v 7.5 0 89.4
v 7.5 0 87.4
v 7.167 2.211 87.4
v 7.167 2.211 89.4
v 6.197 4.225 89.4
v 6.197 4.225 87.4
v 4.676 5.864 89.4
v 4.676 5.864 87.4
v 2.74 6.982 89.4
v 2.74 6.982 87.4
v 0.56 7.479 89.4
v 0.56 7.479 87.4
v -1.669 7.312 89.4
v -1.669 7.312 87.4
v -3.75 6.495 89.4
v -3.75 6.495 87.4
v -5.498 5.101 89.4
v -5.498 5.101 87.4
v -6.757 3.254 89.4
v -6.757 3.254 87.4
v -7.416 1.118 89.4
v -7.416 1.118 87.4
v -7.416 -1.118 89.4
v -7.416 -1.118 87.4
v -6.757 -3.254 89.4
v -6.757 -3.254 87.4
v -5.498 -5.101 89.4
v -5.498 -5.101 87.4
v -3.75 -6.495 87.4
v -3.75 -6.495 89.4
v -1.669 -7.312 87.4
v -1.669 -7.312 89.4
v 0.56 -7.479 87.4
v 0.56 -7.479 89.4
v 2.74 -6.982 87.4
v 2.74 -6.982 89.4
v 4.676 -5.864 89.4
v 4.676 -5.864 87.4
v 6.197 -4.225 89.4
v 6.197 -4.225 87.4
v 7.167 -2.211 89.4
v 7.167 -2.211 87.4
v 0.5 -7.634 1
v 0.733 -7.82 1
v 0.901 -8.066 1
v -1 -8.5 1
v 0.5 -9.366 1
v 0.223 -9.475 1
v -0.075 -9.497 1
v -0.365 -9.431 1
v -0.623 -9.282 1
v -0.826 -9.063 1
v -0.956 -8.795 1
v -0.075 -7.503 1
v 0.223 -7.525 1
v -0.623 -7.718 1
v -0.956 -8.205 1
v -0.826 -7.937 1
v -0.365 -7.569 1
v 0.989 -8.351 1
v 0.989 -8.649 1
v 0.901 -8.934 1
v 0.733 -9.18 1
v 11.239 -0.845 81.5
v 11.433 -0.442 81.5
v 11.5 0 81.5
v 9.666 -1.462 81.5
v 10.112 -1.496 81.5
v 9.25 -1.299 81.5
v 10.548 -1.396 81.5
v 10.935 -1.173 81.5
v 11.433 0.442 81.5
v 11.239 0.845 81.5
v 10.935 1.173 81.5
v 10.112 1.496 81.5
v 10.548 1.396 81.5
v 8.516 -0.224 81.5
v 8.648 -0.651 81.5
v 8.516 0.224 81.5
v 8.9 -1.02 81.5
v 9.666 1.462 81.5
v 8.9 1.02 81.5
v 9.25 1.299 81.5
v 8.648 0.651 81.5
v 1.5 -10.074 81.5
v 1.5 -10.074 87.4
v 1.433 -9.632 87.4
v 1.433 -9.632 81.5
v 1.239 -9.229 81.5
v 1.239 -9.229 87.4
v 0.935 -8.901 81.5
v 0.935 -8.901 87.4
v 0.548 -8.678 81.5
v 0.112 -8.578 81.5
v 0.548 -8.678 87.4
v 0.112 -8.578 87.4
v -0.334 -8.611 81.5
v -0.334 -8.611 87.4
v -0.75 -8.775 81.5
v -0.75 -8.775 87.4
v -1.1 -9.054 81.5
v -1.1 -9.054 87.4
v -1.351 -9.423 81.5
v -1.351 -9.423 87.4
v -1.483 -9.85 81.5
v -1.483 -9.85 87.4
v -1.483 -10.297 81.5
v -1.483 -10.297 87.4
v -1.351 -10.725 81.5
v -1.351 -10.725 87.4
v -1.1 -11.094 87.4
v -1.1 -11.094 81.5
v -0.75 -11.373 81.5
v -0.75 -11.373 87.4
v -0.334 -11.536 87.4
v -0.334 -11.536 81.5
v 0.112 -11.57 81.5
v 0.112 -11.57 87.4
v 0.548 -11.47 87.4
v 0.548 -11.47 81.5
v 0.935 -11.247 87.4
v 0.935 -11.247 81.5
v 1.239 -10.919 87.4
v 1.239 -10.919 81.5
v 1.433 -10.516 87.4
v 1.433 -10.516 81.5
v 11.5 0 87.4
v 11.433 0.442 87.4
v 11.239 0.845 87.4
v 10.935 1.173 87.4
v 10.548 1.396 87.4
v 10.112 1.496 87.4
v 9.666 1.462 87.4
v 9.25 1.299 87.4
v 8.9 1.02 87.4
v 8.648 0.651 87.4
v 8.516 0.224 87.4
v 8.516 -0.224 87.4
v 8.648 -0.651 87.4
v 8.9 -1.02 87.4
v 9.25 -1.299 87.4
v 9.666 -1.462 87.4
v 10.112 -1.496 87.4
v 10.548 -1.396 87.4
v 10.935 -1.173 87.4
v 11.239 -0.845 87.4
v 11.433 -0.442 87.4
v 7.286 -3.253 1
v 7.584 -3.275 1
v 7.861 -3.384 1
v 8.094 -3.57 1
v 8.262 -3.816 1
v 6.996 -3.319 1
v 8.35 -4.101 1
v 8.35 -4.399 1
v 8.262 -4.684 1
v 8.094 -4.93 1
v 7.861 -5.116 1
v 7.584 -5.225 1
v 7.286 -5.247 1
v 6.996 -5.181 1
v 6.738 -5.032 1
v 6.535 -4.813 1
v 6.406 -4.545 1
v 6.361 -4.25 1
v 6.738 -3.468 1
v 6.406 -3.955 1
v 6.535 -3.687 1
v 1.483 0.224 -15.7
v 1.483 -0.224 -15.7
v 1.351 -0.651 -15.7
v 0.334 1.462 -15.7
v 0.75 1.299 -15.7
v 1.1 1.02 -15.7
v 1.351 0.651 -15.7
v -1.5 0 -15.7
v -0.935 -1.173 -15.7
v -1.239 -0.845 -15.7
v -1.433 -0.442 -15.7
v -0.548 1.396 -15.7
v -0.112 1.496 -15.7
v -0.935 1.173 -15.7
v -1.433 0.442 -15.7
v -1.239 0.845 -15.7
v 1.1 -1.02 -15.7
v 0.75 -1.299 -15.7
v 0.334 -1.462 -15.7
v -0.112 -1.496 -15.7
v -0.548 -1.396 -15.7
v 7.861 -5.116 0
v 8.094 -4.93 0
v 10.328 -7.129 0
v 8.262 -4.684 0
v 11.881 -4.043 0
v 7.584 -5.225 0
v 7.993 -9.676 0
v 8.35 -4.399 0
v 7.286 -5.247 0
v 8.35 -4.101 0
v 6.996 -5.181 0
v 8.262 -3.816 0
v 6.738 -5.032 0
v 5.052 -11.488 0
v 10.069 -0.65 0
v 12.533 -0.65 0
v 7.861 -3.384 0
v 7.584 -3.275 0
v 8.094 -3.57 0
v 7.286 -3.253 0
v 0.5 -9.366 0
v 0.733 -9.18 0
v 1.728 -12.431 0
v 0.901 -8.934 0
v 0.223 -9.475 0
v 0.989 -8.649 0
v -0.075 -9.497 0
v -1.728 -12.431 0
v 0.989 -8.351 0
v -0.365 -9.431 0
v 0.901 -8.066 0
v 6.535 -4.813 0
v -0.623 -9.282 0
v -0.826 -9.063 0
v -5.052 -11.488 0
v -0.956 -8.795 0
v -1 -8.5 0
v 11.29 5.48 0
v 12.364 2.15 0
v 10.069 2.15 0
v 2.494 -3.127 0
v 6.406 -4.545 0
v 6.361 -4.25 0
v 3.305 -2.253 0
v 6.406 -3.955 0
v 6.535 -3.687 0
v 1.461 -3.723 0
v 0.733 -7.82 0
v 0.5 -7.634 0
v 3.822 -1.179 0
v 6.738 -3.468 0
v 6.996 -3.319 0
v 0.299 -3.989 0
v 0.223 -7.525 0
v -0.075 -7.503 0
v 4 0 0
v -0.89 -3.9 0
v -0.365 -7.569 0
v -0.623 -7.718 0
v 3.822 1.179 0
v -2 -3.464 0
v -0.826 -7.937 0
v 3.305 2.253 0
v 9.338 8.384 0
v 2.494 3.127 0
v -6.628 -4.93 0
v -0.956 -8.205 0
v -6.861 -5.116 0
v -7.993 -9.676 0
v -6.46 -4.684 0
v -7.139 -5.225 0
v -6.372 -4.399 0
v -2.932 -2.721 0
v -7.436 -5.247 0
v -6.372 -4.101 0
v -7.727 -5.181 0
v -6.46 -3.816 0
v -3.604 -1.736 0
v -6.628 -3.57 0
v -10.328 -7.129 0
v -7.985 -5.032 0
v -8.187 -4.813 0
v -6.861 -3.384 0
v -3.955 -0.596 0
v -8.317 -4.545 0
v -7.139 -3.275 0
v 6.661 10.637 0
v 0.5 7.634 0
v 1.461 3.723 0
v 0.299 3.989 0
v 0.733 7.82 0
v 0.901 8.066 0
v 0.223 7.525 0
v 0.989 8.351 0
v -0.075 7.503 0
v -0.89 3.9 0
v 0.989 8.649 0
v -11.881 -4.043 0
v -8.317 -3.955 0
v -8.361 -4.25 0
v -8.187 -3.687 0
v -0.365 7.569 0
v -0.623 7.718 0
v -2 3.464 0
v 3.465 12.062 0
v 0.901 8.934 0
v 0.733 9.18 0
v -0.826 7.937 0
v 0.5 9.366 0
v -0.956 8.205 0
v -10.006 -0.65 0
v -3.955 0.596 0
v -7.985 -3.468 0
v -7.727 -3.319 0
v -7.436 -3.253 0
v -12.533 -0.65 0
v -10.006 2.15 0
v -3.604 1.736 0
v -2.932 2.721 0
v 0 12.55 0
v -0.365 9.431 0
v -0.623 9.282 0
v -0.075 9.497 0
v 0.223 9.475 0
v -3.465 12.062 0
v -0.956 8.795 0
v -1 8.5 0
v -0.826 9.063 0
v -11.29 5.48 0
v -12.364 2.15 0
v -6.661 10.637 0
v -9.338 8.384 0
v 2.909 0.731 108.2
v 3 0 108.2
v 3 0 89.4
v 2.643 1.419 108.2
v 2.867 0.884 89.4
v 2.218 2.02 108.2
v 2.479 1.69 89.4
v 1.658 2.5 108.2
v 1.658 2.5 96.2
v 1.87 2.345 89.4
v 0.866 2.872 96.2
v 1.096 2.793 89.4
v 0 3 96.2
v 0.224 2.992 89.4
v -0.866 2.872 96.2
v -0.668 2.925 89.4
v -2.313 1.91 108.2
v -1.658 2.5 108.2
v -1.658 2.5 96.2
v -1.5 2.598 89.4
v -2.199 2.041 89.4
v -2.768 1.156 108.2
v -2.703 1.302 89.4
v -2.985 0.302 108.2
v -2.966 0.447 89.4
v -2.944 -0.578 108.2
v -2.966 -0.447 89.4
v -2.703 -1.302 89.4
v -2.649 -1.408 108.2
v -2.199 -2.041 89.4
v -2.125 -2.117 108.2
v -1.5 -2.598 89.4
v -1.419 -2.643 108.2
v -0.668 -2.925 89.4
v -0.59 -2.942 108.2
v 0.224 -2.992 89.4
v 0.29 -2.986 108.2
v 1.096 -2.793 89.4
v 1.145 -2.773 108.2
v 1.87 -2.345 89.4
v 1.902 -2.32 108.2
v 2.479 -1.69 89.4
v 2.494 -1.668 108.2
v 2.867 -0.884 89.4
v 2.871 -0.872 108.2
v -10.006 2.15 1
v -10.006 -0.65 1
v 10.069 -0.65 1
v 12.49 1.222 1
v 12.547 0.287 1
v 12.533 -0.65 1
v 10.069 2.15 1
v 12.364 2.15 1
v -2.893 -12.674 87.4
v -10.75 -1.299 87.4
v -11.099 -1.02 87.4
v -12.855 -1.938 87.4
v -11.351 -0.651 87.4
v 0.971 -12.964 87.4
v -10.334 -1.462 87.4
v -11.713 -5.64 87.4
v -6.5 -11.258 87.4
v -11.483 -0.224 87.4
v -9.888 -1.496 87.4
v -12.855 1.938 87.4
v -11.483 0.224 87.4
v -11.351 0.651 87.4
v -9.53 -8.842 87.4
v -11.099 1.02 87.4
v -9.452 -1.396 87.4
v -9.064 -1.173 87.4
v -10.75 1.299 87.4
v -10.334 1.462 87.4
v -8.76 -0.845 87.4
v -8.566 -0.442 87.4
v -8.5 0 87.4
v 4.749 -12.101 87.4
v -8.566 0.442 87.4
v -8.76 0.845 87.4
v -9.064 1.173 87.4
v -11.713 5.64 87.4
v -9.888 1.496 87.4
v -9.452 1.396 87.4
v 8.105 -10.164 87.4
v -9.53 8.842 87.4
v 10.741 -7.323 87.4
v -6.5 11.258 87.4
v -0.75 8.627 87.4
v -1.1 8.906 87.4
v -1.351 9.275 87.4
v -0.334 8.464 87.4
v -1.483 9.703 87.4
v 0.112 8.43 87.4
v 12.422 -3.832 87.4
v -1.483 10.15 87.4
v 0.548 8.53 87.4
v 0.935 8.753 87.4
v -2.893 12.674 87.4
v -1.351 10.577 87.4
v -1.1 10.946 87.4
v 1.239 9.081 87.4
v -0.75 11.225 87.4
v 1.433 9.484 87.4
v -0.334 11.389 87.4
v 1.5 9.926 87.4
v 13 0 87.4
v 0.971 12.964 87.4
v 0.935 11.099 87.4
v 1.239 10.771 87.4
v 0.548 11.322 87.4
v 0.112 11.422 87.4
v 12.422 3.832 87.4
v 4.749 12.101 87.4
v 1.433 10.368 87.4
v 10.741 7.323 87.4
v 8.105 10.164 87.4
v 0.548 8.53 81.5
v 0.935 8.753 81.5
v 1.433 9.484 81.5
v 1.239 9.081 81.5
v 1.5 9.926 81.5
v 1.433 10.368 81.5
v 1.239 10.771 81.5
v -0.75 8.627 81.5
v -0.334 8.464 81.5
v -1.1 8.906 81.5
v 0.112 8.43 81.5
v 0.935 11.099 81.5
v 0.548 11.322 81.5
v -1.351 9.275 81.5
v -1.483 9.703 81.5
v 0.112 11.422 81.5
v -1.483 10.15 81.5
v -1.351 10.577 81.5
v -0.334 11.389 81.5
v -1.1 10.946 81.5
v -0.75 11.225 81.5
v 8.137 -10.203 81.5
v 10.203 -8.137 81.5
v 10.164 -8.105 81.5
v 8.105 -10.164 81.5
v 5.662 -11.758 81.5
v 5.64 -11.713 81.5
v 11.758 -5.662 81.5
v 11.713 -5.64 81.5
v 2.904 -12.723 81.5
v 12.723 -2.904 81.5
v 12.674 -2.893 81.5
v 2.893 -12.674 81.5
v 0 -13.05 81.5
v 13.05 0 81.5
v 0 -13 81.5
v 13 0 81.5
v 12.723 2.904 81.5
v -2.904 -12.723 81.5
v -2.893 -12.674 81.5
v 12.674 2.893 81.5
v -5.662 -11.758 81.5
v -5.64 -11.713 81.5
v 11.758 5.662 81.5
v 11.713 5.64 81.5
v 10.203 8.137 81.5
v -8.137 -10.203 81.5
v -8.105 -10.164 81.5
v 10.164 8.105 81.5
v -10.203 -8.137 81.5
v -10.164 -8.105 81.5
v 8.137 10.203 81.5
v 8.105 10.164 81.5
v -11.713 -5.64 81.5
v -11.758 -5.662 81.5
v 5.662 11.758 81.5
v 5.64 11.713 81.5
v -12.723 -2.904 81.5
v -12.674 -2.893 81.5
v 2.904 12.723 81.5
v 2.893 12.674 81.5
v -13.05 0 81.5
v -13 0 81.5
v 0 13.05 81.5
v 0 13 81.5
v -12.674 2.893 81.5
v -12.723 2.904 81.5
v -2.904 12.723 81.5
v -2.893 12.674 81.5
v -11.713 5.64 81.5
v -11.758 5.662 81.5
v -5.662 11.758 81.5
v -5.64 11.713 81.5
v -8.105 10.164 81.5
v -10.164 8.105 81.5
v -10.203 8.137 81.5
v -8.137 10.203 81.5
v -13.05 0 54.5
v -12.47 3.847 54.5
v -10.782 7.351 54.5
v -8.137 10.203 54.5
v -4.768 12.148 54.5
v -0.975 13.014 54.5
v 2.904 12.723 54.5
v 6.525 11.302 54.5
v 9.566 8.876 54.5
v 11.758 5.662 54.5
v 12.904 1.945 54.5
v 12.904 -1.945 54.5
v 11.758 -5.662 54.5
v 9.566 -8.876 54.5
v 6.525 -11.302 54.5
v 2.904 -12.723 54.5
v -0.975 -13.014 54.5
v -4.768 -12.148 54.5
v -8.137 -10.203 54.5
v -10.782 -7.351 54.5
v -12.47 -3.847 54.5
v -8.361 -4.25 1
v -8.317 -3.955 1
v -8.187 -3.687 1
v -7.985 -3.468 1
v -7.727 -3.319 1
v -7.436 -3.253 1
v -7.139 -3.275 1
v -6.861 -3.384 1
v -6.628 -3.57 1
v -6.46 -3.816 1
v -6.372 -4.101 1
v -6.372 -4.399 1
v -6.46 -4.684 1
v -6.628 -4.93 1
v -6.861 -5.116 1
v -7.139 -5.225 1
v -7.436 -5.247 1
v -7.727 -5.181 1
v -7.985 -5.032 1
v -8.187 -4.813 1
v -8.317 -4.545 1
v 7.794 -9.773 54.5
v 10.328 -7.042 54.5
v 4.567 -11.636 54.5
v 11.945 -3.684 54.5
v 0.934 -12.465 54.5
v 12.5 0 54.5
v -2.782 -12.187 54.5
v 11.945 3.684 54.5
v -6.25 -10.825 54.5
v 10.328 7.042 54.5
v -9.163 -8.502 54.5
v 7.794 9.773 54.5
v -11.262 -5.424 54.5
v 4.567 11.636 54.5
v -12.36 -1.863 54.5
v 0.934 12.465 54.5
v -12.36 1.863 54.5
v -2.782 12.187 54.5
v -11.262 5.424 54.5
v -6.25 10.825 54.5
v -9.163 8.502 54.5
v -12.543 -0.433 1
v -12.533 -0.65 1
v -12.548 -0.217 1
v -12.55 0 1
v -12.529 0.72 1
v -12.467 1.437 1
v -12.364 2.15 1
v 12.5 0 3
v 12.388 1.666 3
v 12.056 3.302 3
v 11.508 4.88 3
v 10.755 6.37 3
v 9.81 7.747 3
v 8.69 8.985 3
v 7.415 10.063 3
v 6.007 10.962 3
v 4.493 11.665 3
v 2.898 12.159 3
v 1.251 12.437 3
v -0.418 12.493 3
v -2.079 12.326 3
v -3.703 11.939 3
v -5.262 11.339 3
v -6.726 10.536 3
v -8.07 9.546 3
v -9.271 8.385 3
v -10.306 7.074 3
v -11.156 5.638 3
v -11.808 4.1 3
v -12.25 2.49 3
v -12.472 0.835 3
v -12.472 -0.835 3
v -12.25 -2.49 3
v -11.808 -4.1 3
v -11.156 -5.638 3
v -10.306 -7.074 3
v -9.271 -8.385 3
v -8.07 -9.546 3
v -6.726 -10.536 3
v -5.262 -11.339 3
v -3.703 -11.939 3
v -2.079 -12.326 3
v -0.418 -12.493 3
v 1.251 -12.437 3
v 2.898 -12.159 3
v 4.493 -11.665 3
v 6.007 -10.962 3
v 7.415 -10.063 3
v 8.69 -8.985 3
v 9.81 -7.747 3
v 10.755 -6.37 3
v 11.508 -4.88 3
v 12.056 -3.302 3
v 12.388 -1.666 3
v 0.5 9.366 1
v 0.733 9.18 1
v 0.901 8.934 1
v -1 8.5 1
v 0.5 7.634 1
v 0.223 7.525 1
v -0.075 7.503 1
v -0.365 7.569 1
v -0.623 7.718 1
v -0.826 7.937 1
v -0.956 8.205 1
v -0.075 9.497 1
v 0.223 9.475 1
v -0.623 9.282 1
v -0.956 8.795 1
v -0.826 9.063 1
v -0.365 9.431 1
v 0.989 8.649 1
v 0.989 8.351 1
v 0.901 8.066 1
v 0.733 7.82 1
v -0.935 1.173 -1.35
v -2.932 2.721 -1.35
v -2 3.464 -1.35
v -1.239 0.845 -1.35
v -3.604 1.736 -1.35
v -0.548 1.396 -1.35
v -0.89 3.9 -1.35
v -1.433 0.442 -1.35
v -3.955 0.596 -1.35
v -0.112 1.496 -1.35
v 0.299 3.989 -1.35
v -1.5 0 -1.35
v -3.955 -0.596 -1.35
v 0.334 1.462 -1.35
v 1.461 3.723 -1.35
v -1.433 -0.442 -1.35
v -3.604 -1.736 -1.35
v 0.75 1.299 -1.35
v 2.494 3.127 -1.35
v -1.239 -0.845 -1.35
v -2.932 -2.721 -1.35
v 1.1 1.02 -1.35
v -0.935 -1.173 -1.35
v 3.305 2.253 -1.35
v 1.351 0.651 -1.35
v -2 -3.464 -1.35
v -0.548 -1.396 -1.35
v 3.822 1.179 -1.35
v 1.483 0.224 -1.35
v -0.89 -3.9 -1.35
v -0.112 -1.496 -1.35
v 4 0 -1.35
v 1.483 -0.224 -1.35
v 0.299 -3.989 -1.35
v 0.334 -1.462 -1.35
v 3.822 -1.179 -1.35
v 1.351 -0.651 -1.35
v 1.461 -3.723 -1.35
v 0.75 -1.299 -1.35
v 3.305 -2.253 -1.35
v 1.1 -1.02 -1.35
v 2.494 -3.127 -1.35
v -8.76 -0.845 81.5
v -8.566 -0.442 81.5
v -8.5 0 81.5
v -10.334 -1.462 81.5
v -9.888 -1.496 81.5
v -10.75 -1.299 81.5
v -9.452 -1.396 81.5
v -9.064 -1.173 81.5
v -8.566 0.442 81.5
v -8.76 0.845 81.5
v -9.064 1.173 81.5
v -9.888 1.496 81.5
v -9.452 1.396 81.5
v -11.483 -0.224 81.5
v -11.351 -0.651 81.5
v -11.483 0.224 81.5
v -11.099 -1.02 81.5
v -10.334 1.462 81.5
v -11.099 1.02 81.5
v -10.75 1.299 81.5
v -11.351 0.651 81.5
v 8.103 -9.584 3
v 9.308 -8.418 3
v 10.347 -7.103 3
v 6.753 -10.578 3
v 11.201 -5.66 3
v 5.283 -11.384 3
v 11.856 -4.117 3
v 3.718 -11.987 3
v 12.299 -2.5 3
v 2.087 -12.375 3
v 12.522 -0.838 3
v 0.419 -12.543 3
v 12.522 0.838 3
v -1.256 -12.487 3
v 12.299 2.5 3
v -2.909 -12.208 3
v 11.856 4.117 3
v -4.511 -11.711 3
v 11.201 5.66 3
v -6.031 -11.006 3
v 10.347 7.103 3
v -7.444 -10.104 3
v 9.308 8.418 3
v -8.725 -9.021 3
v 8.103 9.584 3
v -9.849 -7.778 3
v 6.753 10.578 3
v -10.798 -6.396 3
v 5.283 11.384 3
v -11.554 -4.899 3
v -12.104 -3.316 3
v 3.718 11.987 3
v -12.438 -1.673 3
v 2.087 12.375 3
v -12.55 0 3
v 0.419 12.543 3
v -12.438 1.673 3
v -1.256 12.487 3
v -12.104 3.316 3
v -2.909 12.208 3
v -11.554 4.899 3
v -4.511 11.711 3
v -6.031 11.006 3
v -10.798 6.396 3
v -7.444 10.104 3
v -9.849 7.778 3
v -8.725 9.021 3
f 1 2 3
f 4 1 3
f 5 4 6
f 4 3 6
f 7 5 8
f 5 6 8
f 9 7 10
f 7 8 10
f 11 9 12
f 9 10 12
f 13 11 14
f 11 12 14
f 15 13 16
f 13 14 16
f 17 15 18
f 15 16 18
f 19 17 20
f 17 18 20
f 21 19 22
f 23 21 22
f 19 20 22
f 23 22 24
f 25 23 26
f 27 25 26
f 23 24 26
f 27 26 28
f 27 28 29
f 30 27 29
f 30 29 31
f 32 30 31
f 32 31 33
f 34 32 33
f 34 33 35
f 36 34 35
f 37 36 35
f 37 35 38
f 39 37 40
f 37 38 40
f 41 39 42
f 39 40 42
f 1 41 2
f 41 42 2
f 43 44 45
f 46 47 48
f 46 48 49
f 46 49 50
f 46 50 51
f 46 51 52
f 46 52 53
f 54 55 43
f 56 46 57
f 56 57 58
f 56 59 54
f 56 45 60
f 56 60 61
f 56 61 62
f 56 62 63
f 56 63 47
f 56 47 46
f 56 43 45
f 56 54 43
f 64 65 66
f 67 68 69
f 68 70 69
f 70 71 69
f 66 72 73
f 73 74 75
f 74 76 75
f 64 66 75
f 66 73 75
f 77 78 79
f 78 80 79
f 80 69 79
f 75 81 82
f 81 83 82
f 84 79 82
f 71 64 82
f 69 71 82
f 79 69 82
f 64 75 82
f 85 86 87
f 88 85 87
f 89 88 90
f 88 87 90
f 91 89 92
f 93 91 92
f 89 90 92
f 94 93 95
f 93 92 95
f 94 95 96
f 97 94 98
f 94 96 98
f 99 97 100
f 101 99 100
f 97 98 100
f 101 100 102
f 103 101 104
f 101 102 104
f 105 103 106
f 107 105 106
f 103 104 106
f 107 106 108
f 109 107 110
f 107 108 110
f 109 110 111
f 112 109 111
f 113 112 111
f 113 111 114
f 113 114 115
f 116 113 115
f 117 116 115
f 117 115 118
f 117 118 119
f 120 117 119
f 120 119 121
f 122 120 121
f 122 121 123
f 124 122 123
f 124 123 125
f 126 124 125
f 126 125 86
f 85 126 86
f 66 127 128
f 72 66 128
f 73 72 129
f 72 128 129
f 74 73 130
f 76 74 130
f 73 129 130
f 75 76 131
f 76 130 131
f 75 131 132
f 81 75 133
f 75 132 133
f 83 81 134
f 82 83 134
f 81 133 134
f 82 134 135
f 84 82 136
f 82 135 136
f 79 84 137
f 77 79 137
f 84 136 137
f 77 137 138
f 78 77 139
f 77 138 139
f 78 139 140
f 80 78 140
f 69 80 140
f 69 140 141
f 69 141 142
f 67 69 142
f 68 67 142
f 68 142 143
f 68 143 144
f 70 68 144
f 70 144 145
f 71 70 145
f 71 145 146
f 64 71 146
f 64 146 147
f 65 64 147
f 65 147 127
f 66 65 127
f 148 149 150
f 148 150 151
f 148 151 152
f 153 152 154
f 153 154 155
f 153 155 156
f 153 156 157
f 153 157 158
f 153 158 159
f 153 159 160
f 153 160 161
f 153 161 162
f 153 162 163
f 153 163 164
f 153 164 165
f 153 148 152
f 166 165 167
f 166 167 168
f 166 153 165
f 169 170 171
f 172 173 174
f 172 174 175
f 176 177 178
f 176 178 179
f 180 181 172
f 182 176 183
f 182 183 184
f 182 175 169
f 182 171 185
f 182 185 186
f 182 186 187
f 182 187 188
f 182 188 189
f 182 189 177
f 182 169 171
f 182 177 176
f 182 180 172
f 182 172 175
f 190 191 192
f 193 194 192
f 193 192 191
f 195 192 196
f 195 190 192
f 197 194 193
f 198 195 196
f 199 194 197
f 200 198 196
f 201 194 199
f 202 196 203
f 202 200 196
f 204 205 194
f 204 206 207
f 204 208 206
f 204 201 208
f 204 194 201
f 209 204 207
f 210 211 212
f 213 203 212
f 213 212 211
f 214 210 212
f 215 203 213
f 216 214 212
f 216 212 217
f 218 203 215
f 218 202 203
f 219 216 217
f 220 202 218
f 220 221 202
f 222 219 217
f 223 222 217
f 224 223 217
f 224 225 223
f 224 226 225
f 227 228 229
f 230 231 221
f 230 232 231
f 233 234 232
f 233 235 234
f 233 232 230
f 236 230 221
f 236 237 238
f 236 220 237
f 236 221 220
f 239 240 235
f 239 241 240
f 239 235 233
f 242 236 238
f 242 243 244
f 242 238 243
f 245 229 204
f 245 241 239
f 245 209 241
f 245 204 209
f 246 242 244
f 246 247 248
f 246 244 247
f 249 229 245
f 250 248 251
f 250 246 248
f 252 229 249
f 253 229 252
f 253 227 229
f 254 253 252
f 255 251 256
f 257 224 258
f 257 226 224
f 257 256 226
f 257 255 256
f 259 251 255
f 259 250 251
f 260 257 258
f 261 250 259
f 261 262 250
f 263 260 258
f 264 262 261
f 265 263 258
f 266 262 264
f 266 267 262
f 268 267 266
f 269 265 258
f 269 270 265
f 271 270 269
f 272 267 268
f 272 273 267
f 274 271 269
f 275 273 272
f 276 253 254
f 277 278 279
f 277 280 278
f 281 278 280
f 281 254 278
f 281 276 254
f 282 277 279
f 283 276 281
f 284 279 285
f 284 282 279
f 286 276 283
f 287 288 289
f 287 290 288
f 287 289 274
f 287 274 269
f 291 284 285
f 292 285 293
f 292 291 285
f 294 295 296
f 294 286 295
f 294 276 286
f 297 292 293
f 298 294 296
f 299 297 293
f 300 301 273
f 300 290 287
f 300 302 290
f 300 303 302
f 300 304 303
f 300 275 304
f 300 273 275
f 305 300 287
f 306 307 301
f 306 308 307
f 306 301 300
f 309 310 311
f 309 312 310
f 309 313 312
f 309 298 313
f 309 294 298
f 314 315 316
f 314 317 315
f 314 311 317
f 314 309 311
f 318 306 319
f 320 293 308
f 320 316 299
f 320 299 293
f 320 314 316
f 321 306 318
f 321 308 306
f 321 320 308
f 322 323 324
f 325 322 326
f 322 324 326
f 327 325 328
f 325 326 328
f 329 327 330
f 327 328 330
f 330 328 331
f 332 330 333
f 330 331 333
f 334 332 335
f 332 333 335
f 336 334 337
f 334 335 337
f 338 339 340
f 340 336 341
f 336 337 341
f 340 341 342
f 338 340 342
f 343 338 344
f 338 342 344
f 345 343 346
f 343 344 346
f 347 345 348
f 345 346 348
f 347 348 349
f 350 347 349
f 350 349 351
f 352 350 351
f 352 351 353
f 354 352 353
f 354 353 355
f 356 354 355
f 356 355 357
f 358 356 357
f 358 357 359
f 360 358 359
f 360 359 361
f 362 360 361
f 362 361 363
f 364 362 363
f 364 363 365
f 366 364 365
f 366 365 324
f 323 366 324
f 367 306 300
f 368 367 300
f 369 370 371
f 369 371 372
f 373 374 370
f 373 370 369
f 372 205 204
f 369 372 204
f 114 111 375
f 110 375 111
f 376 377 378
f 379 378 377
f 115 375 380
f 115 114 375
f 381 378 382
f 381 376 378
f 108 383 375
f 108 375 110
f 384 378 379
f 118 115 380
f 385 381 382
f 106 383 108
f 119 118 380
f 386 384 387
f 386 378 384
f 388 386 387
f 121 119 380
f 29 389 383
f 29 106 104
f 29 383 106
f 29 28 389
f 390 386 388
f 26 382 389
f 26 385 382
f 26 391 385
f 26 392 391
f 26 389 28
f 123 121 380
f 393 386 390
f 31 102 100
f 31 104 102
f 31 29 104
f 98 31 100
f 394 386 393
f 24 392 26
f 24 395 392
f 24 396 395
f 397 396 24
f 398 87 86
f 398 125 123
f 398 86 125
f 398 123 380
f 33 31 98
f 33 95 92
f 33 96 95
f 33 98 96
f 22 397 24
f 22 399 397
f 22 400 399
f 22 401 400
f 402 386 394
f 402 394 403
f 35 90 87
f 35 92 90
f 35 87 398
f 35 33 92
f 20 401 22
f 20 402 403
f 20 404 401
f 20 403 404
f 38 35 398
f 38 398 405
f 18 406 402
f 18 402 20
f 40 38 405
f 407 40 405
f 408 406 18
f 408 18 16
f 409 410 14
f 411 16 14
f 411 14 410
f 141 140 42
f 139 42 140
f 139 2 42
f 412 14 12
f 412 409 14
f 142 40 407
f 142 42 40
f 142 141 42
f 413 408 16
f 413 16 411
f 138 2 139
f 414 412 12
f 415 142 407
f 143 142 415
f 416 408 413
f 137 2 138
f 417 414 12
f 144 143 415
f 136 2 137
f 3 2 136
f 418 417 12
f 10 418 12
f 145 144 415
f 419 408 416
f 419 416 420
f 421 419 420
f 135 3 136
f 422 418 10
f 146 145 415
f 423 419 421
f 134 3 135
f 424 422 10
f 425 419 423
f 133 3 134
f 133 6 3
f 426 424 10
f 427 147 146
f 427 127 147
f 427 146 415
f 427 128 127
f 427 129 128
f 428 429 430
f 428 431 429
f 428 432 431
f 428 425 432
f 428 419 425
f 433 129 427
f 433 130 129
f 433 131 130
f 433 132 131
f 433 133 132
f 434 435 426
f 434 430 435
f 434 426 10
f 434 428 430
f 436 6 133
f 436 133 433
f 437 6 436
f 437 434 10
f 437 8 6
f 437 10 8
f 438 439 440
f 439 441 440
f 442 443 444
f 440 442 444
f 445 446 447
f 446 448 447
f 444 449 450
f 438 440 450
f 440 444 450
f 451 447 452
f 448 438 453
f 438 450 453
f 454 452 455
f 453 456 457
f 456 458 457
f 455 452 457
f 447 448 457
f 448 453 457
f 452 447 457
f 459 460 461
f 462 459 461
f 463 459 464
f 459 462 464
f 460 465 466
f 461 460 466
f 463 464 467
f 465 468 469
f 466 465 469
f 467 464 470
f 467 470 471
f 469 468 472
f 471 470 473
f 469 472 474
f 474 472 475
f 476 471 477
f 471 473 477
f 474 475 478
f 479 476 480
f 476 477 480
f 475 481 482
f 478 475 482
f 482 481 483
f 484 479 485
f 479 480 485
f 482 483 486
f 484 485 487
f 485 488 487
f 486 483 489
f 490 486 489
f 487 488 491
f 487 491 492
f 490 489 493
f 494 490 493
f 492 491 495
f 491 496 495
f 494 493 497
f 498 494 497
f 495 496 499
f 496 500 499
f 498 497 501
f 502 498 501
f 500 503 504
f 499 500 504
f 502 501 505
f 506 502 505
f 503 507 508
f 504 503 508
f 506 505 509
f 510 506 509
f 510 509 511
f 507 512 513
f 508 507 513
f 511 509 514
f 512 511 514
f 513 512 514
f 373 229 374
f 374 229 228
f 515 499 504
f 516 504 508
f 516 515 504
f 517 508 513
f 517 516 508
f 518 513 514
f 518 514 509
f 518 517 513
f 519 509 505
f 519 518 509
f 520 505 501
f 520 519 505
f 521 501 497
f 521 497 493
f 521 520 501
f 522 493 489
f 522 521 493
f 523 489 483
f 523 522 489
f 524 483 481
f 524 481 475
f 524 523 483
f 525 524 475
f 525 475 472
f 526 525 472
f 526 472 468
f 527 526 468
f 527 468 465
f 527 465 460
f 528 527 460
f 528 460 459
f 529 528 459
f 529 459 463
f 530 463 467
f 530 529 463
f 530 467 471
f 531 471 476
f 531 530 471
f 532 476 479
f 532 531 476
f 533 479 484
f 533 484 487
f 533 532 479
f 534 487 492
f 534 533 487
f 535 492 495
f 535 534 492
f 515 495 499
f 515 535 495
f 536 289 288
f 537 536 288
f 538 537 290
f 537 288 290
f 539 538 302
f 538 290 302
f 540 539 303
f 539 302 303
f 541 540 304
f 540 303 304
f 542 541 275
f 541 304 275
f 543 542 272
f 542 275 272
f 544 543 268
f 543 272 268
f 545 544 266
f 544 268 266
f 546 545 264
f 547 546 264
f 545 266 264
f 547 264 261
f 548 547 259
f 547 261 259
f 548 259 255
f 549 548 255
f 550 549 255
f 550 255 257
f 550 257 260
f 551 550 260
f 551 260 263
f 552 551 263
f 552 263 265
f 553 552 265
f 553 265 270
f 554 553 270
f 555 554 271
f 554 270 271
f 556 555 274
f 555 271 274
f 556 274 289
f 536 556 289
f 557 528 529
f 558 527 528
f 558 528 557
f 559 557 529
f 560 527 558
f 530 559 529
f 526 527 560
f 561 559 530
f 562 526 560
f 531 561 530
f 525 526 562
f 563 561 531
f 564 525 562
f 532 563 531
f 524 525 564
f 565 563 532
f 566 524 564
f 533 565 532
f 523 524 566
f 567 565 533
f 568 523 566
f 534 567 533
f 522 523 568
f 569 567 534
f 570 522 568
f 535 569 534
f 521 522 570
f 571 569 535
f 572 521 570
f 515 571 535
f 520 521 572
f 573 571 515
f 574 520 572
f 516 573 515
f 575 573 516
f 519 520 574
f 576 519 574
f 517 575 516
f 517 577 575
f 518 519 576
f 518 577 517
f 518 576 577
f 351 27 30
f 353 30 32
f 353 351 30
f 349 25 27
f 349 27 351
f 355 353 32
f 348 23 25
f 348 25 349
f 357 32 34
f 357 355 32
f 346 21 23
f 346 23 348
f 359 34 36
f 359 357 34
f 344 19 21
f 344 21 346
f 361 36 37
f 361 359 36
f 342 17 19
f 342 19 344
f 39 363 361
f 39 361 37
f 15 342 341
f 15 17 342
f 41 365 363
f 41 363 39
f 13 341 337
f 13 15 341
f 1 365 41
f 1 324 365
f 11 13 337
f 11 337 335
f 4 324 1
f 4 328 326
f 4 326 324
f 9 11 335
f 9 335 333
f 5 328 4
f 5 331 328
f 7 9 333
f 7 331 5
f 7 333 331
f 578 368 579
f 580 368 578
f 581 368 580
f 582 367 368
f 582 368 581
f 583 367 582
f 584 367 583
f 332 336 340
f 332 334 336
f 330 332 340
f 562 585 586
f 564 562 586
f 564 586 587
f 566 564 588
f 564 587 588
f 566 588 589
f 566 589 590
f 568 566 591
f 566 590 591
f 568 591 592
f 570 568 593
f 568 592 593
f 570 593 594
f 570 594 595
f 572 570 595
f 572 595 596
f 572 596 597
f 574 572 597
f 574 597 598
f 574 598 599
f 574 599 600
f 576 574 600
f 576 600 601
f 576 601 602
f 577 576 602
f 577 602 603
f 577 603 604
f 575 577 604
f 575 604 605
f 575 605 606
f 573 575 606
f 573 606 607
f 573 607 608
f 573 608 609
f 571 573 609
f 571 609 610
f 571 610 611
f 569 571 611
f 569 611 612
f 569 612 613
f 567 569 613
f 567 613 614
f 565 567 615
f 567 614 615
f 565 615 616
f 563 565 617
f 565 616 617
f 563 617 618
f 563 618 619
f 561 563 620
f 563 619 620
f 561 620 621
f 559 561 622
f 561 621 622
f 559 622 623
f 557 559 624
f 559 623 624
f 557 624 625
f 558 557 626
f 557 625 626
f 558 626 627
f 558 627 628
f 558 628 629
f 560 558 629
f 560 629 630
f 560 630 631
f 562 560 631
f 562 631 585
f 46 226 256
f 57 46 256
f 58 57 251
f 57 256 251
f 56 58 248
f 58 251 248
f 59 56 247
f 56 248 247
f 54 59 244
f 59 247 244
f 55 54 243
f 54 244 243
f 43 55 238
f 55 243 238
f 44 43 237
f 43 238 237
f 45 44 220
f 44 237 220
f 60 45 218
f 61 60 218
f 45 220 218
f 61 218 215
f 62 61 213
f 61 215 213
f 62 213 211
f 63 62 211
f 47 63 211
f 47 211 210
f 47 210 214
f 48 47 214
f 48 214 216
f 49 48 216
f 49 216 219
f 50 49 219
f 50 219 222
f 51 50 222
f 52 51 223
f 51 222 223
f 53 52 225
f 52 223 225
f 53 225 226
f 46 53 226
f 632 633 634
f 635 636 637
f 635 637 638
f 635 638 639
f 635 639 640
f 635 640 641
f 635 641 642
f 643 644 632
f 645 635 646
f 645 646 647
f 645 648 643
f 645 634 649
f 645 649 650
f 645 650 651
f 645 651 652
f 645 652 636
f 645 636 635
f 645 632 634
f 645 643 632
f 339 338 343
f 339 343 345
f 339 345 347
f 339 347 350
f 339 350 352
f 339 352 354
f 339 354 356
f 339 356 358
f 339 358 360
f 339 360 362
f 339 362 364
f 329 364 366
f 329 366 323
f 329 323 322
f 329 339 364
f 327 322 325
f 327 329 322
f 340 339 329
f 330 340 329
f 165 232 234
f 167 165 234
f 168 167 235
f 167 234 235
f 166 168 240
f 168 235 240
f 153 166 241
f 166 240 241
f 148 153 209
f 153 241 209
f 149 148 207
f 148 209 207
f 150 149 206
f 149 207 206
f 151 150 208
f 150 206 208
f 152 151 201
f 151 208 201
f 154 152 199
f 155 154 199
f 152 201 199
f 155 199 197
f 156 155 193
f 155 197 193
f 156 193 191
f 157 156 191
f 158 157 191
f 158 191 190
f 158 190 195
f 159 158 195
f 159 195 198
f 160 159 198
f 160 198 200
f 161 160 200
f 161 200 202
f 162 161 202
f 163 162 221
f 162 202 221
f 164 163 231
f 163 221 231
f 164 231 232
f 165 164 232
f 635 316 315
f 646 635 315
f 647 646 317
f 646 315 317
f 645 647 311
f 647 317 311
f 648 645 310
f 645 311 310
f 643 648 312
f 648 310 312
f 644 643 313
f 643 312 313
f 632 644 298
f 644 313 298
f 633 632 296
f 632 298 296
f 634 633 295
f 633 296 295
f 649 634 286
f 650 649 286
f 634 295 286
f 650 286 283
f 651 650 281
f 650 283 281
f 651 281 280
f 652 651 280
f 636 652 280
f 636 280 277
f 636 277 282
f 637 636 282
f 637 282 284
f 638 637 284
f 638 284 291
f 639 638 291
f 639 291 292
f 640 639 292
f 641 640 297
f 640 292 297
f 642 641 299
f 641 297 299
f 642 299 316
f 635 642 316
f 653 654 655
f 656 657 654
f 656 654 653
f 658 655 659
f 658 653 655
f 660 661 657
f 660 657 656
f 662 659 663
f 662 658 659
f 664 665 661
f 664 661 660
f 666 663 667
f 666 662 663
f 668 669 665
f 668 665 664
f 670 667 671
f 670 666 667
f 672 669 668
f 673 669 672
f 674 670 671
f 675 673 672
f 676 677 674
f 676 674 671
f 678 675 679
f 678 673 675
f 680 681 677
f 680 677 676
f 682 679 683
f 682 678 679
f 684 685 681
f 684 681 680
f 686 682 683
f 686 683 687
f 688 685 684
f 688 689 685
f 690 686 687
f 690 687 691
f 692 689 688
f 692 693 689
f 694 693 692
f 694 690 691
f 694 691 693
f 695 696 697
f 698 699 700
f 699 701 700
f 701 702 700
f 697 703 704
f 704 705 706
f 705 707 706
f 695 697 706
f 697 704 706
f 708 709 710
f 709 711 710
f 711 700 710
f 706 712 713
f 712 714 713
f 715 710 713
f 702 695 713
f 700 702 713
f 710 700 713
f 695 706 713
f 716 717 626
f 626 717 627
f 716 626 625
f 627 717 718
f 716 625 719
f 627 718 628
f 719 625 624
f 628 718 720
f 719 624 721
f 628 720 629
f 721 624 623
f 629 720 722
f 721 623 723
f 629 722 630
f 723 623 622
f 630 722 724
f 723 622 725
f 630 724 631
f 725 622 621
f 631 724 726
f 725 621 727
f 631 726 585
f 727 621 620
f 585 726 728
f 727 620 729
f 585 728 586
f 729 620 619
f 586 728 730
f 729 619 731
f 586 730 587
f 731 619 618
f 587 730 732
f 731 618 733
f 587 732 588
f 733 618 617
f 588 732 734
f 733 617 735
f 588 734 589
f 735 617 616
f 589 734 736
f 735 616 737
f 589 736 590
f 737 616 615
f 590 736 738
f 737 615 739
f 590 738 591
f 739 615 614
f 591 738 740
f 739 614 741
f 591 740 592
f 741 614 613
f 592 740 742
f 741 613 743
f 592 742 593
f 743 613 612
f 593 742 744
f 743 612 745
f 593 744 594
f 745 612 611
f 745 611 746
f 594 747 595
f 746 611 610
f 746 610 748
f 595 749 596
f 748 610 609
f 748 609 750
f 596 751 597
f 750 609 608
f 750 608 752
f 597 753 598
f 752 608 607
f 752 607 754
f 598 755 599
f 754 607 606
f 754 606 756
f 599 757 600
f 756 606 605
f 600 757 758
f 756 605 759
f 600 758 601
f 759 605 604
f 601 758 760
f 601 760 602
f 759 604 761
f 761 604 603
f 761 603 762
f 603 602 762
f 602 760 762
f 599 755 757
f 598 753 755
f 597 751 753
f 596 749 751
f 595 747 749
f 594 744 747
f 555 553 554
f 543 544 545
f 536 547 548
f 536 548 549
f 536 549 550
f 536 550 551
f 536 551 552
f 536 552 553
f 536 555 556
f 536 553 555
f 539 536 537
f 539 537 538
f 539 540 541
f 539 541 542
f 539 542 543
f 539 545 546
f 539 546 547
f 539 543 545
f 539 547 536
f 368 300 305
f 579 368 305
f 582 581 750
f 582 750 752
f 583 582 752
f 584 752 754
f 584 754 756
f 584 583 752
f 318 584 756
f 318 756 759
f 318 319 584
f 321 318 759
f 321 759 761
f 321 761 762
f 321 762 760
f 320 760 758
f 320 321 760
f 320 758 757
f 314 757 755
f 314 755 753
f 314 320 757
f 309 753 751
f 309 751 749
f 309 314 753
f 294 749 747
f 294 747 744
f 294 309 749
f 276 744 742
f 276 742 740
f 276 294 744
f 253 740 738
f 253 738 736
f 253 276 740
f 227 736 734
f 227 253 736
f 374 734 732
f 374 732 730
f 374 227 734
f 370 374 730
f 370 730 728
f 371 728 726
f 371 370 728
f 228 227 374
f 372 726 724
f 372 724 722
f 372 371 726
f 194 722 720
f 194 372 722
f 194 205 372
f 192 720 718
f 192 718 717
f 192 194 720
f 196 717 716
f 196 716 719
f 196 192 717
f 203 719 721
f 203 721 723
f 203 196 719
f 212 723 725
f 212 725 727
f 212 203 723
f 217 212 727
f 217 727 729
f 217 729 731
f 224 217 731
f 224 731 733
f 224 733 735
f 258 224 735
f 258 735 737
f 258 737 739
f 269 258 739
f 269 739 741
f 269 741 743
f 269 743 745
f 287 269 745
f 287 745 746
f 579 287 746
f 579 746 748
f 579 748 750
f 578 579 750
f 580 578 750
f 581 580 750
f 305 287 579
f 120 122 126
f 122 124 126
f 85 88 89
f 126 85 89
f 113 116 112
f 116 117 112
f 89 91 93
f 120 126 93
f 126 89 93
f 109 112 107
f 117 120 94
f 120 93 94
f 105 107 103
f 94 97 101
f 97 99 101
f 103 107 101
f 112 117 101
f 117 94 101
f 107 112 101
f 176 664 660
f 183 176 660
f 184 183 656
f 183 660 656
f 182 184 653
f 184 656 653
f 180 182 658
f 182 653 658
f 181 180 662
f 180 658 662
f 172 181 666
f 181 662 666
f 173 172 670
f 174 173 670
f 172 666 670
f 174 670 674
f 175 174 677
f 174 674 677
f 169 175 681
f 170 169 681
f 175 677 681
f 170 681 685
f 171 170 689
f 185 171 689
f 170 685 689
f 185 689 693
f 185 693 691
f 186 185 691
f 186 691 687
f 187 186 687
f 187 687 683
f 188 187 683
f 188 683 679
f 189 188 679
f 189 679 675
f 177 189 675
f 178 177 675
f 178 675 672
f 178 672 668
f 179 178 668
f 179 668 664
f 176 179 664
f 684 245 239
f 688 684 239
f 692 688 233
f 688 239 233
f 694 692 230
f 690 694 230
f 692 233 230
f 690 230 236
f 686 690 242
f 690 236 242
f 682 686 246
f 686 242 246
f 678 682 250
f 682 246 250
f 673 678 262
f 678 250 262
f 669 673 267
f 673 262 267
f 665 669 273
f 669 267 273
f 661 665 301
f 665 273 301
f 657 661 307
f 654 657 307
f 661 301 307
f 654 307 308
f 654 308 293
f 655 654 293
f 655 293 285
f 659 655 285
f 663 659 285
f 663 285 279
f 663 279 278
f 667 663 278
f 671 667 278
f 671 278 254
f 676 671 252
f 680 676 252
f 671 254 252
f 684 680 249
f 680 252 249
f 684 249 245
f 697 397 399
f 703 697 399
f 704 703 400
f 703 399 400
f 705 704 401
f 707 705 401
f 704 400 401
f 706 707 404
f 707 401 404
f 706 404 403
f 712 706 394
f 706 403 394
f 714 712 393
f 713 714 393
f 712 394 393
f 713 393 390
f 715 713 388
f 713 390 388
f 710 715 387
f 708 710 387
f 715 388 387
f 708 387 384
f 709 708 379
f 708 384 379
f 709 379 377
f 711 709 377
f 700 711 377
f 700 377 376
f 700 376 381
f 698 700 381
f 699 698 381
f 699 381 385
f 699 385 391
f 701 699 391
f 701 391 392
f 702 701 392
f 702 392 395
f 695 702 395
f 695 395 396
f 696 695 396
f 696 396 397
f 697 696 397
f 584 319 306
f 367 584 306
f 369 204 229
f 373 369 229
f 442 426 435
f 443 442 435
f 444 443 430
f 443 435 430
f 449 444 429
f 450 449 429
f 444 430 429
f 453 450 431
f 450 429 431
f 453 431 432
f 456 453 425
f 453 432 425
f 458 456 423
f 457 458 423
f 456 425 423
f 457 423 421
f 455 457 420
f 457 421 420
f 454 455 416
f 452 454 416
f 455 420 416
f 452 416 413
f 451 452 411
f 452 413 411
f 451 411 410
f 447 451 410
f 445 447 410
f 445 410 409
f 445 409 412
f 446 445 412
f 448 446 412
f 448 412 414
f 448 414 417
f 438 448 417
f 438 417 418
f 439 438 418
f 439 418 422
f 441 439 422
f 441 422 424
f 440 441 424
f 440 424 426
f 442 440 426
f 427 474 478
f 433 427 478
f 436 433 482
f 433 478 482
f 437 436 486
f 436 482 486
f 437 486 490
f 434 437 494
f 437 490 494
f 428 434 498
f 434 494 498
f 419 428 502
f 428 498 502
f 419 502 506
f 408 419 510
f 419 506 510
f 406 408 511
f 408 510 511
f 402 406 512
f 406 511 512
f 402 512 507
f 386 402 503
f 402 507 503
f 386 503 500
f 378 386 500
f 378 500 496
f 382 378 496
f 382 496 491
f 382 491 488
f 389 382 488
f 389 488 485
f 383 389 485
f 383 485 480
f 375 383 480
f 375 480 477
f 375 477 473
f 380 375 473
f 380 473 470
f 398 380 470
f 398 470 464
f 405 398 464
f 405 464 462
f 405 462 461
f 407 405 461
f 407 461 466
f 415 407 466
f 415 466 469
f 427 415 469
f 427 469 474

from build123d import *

# Parameters (mm, degrees)
ESQUISSE1_R             = 12.5
BOSS_EXTRU_1_DEPTH      = 54.5
ESQUISSE2_R             = 4
BOSS_EXTRU_2_DEPTH      = 1.35
ESQUISSE3_R             = 1.5
BOSS_EXTRU_3_DEPTH      = 15.7
ESQUISSE4_R             = 13
BOSS_EXTRU_4_DEPTH      = 32.9
ESQUISSE5_R             = 7.5
BOSS_EXTRU_5_DEPTH      = 2
ESQUISSE7_R             = 3
BOSS_EXTRU_6_DEPTH      = 20.8
ESQUISSE8_W             = 9.608231015
ESQUISSE8_H             = 12.440367957
ENL_V_MAT_EXTRU_1_DEPTH = 12
ESQUISSE9_R             = 1.5
ENL_V_MAT_EXTRU_2_DEPTH = 12
ESQUISSE10_R            = 13.05
BOSS_EXTRU_7_DEPTH      = 27
ESQUISSE11_R            = 12.55
BOSS_EXTRU_8_DEPTH      = 3
ESQUISSE12_R            = 1
ENL_V_MAT_EXTRU_4_DEPTH = 1


with BuildPart() as part:
    # Esquisse1 → Boss.-Extru.1 (new body)
    with BuildSketch(Plane.XY):
        Circle(ESQUISSE1_R)
    extrude(amount=BOSS_EXTRU_1_DEPTH)

    # Esquisse2 → Boss.-Extru.2 (add)
    with BuildSketch(Plane(origin=(0, 0, 0), x_dir=(-1, 0, 0), z_dir=(0, 0, -1))):
        with Locations(Location((0, 0, 0), (0, 0, 180))):
            Circle(ESQUISSE2_R)
    extrude(amount=BOSS_EXTRU_2_DEPTH)

    # Esquisse3 → Boss.-Extru.3 (add)
    with BuildSketch(Plane(origin=(0, 0, 0), x_dir=(-1, 0, 0), z_dir=(0, 0, -1))):
        Circle(ESQUISSE3_R)
    extrude(amount=BOSS_EXTRU_3_DEPTH)

    # Esquisse4 → Boss.-Extru.4 (add)
    with BuildSketch(Plane.XY.offset(54.5)):
        Circle(ESQUISSE4_R)
    extrude(amount=BOSS_EXTRU_4_DEPTH)

    # Esquisse5 → Boss.-Extru.5 (add)
    with BuildSketch(Plane.XY.offset(87.4)):
        Circle(ESQUISSE5_R)
    extrude(amount=BOSS_EXTRU_5_DEPTH)

    # Esquisse7 → Boss.-Extru.6 (add)
    with BuildSketch(Plane.XY.offset(87.4)):
        Circle(ESQUISSE7_R)
    extrude(amount=BOSS_EXTRU_6_DEPTH)

    # Esquisse8 → Enlèv. mat.-Extru.1 (cut)
    with BuildSketch(Plane.XY.offset(108.2)):
        with Locations((-0.725995737, 8.720183978)):
            Rectangle(ESQUISSE8_W, ESQUISSE8_H)
    extrude(amount=-ENL_V_MAT_EXTRU_1_DEPTH, mode=Mode.SUBTRACT)

    # Esquisse9 → Enlèv. mat.-Extru.2 (cut)
    with BuildSketch(Plane.XY.offset(87.4)):
        with Locations((-9.999727195, 0)):
            Circle(ESQUISSE9_R)
        with Locations((9.999727195, 0)):
            Circle(ESQUISSE9_R)
        with Locations((0, -10.073864879)):
            Circle(ESQUISSE9_R)
        with Locations((0, 9.926135121)):
            Circle(ESQUISSE9_R)
    extrude(amount=-ENL_V_MAT_EXTRU_2_DEPTH, mode=Mode.SUBTRACT)

    # Esquisse10 → Boss.-Extru.7 (add)
    with BuildSketch(Plane(origin=(0, 0, 54.5), x_dir=(-1, 0, 0), z_dir=(0, 0, -1))):
        Circle(ESQUISSE10_R)
    extrude(amount=-BOSS_EXTRU_7_DEPTH)

    # Esquisse11 → Boss.-Extru.8 (add)
    with BuildSketch(Plane(origin=(0, 0, 0), x_dir=(-1, 0, 0), z_dir=(0, 0, -1))):
        Circle(ESQUISSE11_R)
    extrude(amount=-BOSS_EXTRU_8_DEPTH)

    # Esquisse12 → Enlèv. mat.-Extru.4 (cut)
    with BuildSketch(Plane(origin=(0, 0, 0), x_dir=(-1, 0, 0), z_dir=(0, 0, -1))):
        with Locations((0, 8.5)):
            Circle(ESQUISSE12_R)
        with Locations((7.361215932, -4.25)):
            Circle(ESQUISSE12_R)
        with Locations((0, -8.5)):
            Circle(ESQUISSE12_R)
        with Locations((-7.361215932, -4.25)):
            Circle(ESQUISSE12_R)
        with BuildLine():
            Line((12.364465213, 2.15), (10.005928826, 2.15))
            Line((10.005928826, 2.15), (10.005928826, -0.65))
            Line((10.005928826, -0.65), (12.533156027, -0.65))
            ThreePointArc((12.533156027, -0.65), (12.527285654, 0.754727863), (12.364465213, 2.15))
        make_face()
        with BuildLine():
            Line((-12.533156027, -0.65), (-10.068828371, -0.65))
            Line((-10.068828371, -0.65), (-10.068828371, 2.15))
            Line((-10.068828371, 2.15), (-12.364465213, 2.15))
            ThreePointArc((-12.364465213, 2.15), (-12.527285654, 0.754727863), (-12.533156027, -0.65))
        make_face()
    extrude(amount=-ENL_V_MAT_EXTRU_4_DEPTH, mode=Mode.SUBTRACT)


solid = part.part
